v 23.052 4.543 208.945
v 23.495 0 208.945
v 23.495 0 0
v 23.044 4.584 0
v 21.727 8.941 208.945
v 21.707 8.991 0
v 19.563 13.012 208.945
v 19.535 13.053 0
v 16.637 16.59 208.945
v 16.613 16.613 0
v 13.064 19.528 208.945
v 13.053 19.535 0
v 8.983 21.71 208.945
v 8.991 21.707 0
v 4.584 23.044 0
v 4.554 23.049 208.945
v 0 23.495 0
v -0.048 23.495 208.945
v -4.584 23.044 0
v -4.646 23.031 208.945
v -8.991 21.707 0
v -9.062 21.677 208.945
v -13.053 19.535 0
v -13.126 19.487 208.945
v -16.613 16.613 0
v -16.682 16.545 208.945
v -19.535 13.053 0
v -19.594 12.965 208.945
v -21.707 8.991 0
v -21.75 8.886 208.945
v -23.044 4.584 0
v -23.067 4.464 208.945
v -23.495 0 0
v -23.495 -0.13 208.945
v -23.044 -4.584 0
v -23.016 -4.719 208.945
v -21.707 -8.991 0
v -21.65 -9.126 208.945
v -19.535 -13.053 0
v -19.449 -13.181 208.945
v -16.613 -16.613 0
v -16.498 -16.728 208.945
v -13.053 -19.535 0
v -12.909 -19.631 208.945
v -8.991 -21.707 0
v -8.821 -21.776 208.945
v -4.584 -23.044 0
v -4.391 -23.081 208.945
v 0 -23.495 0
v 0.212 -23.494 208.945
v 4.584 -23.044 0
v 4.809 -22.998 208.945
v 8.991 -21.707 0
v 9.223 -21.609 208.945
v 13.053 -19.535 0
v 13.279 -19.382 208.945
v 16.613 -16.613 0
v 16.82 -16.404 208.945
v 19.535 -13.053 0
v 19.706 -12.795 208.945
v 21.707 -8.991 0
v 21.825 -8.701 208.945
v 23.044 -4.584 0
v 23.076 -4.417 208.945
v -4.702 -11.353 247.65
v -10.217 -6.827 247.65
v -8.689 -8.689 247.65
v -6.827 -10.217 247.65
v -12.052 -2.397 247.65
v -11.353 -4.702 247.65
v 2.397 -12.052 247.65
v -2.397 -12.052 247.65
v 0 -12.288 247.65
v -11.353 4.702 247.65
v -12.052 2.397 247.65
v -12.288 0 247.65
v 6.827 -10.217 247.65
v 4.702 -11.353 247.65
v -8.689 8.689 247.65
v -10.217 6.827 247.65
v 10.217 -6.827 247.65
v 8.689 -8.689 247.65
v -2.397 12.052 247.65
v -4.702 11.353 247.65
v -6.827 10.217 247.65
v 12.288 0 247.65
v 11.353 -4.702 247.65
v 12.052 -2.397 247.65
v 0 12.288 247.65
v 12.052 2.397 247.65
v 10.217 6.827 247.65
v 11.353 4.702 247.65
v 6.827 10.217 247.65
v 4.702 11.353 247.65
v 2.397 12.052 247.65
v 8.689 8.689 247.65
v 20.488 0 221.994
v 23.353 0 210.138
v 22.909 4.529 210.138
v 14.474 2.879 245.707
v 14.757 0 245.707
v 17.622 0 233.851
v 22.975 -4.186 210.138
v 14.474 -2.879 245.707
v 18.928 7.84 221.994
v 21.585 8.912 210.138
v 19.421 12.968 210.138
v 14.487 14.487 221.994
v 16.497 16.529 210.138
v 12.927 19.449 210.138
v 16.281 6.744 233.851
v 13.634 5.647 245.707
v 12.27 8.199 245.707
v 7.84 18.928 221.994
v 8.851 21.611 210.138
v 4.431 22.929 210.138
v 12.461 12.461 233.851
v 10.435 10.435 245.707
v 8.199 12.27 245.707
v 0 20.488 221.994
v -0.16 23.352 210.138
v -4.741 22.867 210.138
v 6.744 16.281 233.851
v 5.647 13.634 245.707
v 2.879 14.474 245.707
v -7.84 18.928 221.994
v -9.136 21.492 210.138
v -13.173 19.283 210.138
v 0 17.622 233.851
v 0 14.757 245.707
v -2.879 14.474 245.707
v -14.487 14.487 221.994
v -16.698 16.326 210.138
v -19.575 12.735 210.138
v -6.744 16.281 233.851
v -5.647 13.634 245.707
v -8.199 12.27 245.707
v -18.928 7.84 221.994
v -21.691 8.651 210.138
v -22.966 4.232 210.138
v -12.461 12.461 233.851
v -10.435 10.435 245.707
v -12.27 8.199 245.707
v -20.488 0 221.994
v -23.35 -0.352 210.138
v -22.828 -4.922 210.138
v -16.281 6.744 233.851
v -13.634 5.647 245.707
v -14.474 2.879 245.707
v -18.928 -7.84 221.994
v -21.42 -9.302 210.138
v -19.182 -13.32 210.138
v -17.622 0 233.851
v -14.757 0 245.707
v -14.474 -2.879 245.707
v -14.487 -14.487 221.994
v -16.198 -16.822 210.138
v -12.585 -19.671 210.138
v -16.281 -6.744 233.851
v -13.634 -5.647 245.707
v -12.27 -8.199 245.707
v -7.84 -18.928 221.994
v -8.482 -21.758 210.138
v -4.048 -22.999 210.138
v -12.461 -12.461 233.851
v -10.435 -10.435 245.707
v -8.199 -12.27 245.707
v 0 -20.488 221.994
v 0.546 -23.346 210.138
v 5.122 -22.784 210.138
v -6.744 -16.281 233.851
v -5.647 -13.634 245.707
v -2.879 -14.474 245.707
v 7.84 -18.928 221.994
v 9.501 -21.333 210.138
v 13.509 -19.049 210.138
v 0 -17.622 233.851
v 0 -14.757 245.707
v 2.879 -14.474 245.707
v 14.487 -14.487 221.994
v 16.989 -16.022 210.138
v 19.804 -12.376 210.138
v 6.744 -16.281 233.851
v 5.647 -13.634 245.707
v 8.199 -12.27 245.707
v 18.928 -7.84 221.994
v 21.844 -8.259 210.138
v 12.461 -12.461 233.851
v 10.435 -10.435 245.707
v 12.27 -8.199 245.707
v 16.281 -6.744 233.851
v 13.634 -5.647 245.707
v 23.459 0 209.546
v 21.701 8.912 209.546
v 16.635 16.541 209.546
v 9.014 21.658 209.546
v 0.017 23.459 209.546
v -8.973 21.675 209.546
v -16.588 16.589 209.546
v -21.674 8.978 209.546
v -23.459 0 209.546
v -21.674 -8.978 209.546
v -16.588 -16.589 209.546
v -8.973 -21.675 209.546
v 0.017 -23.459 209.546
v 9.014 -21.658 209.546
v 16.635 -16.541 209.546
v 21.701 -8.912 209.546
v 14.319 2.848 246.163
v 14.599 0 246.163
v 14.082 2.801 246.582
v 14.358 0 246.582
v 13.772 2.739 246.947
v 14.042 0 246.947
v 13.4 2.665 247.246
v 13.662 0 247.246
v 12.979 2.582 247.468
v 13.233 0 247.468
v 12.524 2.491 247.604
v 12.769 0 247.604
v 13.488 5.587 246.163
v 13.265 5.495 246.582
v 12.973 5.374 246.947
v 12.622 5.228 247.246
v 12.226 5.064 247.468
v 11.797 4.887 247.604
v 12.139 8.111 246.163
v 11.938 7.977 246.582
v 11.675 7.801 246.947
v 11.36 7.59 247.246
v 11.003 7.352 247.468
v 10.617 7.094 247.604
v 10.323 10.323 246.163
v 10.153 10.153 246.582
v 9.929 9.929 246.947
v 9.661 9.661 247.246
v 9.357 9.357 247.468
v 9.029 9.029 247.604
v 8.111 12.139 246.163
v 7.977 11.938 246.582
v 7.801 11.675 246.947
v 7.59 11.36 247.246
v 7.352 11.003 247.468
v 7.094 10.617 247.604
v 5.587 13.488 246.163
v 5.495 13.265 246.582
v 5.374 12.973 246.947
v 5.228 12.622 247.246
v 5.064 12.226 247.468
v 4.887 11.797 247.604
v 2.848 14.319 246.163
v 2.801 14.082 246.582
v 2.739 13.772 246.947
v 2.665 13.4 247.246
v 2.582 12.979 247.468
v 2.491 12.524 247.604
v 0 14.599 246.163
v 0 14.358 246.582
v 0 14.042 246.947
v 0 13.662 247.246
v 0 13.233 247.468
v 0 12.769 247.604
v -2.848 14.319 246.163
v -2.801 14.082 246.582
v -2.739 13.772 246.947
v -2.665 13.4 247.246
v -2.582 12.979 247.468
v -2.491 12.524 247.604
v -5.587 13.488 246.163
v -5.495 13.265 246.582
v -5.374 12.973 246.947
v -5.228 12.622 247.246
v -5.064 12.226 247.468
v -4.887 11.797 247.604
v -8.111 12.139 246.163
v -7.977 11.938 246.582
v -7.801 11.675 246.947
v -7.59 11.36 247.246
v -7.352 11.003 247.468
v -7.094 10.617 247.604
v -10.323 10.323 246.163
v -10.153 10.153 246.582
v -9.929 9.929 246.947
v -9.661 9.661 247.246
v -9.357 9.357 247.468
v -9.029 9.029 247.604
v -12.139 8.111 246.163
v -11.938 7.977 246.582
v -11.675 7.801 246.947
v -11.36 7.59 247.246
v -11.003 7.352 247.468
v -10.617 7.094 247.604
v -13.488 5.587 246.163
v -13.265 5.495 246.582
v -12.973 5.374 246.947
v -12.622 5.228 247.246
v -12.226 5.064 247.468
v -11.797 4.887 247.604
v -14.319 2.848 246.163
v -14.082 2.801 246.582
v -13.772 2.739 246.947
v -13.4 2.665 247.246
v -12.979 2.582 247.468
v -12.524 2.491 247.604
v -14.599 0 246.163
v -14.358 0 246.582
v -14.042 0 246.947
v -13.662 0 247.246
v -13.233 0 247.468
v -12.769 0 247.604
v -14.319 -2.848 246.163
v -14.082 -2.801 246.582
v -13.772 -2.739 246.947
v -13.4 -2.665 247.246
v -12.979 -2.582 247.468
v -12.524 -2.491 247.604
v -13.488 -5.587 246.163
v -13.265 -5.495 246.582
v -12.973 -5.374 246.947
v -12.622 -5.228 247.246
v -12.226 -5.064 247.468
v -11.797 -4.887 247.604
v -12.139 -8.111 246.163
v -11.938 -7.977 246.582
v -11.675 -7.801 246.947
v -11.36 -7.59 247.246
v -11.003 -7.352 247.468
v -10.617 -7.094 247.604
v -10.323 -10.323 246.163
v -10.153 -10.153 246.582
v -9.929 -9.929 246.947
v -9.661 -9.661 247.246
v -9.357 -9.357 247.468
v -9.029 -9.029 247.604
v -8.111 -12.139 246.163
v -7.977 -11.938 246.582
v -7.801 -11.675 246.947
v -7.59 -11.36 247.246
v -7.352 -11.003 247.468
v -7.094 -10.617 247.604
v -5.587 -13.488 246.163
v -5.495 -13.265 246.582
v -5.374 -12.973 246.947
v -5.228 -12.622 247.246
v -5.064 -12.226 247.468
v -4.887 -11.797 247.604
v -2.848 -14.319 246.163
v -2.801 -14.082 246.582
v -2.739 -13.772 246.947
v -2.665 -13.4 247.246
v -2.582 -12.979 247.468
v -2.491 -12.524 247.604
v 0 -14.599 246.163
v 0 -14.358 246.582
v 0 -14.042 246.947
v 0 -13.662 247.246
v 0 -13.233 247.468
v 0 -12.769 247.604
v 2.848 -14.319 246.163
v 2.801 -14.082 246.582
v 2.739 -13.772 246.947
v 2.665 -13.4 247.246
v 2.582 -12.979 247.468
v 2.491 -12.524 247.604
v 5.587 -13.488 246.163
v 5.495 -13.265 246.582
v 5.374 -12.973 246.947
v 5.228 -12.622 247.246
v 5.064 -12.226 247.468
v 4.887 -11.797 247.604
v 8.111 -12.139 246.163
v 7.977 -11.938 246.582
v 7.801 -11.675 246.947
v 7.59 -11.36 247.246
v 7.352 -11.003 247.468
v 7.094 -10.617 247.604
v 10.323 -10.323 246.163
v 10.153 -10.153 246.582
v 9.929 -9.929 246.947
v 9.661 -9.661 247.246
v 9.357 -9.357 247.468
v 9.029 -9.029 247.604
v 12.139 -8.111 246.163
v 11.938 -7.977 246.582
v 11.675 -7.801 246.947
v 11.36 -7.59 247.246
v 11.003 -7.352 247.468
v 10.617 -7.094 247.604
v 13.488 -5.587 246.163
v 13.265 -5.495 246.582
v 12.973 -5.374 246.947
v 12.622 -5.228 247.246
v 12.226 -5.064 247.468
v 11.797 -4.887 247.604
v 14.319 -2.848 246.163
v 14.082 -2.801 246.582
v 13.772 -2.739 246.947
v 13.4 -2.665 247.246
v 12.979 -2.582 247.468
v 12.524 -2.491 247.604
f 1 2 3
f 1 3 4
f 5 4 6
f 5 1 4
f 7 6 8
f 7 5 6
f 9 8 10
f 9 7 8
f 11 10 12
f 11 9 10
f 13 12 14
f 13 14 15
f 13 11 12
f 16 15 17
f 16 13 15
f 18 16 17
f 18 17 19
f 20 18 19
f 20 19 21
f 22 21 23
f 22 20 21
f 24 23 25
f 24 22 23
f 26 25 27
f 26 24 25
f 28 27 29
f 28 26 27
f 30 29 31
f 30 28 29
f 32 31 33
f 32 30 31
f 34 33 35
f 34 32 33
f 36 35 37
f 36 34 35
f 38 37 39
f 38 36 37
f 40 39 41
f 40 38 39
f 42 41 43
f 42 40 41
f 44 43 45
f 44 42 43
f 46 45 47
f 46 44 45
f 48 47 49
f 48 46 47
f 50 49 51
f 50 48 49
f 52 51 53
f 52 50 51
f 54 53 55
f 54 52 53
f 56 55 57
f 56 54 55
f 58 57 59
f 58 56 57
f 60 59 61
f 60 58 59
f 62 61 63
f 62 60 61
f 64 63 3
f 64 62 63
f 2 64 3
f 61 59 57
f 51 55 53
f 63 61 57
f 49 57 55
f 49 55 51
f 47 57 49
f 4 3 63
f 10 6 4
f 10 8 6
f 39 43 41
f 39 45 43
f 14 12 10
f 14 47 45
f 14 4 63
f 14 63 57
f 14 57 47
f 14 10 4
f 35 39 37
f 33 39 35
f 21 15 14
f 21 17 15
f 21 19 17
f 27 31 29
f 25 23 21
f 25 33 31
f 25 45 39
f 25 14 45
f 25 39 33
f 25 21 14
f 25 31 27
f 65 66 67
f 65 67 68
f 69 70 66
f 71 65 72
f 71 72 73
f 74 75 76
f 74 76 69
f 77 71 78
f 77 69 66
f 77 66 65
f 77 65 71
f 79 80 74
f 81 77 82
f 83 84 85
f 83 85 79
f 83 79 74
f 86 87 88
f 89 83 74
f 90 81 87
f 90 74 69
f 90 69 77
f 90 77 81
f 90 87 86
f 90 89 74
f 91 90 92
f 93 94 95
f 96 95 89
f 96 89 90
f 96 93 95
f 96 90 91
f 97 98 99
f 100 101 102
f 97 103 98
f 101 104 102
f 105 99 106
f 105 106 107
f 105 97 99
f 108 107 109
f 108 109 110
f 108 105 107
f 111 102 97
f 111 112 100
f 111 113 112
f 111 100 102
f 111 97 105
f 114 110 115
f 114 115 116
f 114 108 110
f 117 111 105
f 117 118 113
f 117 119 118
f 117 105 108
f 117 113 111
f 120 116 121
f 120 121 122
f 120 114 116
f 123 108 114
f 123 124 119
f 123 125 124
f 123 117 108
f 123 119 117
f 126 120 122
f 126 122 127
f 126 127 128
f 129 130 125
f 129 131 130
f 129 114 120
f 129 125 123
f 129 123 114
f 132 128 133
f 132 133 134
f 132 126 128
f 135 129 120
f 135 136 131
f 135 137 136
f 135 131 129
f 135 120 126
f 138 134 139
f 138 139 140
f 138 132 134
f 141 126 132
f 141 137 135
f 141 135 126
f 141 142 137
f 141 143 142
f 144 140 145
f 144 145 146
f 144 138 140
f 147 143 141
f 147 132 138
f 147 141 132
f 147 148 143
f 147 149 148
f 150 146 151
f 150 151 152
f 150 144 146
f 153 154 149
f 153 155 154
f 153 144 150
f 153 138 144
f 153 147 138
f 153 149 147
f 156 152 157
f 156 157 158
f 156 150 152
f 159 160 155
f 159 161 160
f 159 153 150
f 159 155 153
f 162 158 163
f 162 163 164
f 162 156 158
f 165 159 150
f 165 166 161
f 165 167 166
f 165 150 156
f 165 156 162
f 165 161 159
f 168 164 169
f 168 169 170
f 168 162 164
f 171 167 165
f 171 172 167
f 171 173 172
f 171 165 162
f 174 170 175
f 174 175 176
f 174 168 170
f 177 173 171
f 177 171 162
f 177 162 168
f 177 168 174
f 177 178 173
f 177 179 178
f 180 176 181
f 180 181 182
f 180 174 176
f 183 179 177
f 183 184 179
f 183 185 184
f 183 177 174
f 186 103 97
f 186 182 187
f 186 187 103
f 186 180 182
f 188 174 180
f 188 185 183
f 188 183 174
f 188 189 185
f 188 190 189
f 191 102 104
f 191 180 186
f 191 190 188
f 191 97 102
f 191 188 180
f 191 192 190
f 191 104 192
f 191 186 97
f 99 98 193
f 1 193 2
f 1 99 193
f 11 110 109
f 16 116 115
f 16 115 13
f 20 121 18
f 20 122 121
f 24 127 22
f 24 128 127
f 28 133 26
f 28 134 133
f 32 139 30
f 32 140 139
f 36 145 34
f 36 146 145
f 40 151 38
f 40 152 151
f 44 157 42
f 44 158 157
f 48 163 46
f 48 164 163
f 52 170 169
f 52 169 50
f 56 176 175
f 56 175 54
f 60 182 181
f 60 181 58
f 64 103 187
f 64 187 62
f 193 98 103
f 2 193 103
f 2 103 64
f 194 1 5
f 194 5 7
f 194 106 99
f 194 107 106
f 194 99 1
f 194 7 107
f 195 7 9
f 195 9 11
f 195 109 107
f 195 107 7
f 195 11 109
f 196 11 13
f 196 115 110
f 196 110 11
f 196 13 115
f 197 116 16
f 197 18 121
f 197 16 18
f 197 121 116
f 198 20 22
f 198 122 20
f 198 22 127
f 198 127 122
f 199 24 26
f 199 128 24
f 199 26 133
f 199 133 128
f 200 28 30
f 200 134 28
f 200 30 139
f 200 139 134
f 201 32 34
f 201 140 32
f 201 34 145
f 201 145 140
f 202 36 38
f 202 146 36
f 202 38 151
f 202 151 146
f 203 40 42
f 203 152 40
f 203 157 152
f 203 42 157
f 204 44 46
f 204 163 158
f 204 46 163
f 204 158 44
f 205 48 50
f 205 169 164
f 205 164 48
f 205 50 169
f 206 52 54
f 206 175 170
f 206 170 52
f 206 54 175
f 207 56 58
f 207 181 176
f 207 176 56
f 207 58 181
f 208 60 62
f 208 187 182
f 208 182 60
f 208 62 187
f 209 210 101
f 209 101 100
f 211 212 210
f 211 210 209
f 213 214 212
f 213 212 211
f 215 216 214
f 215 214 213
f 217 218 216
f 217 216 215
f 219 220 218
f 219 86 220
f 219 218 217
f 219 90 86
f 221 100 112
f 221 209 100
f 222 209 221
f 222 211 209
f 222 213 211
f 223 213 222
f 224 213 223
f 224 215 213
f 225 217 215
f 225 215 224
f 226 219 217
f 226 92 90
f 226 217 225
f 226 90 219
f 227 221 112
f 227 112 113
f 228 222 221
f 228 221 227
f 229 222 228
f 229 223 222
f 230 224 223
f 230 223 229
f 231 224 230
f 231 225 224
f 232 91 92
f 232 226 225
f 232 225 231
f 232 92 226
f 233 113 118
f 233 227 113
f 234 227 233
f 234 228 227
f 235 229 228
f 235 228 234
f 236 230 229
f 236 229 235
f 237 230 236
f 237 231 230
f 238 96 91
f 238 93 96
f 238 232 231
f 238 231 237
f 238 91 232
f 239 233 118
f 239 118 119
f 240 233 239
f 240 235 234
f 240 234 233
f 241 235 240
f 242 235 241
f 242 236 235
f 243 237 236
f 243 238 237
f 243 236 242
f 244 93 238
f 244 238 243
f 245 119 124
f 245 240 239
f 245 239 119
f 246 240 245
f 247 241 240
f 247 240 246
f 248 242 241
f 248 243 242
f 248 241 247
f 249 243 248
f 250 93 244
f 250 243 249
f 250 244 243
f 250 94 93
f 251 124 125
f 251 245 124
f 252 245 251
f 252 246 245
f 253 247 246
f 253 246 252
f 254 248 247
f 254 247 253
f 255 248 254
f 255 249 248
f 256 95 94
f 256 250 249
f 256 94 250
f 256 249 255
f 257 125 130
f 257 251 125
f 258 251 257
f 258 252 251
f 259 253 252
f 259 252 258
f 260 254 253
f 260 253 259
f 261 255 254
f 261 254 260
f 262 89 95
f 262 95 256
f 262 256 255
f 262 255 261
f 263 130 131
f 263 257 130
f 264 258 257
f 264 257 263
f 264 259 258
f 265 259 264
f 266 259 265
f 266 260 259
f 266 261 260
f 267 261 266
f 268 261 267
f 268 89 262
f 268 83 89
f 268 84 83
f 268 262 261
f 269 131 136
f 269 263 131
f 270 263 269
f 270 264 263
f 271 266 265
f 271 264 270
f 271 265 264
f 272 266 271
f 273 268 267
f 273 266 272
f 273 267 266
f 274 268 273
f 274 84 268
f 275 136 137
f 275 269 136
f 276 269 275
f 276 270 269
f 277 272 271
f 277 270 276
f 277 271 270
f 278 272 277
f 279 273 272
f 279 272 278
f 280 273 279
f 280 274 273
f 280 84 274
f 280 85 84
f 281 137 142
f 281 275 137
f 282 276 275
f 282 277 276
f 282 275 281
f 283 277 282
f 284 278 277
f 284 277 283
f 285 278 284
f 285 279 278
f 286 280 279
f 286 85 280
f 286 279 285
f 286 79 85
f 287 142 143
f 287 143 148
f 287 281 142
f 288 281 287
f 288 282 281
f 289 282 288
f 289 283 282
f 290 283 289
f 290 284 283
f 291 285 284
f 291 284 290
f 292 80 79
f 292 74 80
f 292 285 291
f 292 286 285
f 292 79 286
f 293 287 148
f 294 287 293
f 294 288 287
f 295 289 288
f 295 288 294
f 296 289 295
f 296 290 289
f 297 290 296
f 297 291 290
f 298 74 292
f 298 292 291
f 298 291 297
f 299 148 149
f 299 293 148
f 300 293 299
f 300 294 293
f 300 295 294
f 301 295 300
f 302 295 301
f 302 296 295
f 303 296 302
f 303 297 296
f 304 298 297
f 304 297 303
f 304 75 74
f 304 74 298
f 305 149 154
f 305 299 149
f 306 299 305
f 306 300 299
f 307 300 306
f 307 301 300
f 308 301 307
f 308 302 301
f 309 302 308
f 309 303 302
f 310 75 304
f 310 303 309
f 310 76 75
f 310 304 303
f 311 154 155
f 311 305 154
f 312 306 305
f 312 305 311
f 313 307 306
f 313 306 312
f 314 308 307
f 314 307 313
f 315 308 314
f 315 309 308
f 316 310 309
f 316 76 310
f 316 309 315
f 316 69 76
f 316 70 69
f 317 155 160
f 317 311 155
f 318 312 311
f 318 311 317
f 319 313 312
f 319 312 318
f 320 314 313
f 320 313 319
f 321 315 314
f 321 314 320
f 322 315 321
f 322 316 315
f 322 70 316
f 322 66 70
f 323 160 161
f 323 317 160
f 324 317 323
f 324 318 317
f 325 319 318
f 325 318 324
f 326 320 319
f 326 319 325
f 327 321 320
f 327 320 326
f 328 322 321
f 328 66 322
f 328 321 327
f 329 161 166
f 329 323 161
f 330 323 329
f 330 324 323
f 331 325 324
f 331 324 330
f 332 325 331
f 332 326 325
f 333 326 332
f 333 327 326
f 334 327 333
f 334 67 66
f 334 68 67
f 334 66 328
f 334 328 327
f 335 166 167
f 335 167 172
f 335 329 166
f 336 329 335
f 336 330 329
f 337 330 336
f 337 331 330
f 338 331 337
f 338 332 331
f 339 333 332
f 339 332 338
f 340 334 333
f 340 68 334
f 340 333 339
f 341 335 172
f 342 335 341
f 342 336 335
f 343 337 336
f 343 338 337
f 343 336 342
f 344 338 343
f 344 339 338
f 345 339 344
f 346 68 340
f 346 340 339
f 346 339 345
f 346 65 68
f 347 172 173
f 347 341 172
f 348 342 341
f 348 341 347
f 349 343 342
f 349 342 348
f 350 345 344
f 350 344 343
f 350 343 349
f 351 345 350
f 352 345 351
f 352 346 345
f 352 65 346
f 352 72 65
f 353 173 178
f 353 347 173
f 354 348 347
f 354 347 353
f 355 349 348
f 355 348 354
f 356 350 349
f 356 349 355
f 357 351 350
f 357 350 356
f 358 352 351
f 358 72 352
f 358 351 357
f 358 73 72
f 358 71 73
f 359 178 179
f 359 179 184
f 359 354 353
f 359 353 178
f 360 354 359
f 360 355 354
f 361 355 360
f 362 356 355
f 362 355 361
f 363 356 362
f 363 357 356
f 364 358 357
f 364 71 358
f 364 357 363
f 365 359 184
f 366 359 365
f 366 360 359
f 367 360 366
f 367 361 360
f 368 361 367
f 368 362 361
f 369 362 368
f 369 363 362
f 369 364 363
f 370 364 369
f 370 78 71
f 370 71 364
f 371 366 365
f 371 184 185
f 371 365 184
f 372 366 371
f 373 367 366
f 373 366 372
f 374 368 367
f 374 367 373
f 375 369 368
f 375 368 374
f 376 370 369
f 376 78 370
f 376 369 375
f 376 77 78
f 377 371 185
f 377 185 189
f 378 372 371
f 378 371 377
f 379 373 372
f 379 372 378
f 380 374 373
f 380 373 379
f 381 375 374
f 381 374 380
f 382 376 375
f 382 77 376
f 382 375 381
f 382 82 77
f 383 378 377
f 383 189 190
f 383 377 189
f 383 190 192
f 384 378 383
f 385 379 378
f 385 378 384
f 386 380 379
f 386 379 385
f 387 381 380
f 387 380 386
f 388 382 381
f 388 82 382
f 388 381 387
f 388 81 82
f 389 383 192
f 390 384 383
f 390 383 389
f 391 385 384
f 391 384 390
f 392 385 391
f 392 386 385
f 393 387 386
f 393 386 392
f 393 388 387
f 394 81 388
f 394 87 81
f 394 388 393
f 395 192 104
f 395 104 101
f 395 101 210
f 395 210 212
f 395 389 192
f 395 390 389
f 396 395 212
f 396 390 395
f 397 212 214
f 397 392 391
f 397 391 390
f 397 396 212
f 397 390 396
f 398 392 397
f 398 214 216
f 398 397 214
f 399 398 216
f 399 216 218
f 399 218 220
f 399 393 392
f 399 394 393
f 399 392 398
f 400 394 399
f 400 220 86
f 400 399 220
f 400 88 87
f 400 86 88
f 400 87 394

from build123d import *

# Parameters (mm, degrees)
F2_R = 2.54
F3_R = 5.08


with BuildPart() as f1:
    # F0 (on Front) → F1 (revolve)
    with BuildSketch(Plane.XZ):
        Polygon((0, 247.65), (0, 0), (23.495, 0), (23.495, 209.55), (14.2875, 247.65), align=None)
    revolve(axis=Axis((0, 0, 5.152837), (0, 0, 1)))

    # F2
    f2_edges = [f1.edges().sort_by_distance(p)[0] for p in [
        (-14.2875, 0, 247.65),
    ]]
    fillet(f2_edges, radius=F2_R)

    # F3
    f3_edges = [f1.edges().sort_by_distance(p)[0] for p in [
        (-23.495, 0, 209.55),
    ]]
    fillet(f3_edges, radius=F3_R)


solid = f1.part
